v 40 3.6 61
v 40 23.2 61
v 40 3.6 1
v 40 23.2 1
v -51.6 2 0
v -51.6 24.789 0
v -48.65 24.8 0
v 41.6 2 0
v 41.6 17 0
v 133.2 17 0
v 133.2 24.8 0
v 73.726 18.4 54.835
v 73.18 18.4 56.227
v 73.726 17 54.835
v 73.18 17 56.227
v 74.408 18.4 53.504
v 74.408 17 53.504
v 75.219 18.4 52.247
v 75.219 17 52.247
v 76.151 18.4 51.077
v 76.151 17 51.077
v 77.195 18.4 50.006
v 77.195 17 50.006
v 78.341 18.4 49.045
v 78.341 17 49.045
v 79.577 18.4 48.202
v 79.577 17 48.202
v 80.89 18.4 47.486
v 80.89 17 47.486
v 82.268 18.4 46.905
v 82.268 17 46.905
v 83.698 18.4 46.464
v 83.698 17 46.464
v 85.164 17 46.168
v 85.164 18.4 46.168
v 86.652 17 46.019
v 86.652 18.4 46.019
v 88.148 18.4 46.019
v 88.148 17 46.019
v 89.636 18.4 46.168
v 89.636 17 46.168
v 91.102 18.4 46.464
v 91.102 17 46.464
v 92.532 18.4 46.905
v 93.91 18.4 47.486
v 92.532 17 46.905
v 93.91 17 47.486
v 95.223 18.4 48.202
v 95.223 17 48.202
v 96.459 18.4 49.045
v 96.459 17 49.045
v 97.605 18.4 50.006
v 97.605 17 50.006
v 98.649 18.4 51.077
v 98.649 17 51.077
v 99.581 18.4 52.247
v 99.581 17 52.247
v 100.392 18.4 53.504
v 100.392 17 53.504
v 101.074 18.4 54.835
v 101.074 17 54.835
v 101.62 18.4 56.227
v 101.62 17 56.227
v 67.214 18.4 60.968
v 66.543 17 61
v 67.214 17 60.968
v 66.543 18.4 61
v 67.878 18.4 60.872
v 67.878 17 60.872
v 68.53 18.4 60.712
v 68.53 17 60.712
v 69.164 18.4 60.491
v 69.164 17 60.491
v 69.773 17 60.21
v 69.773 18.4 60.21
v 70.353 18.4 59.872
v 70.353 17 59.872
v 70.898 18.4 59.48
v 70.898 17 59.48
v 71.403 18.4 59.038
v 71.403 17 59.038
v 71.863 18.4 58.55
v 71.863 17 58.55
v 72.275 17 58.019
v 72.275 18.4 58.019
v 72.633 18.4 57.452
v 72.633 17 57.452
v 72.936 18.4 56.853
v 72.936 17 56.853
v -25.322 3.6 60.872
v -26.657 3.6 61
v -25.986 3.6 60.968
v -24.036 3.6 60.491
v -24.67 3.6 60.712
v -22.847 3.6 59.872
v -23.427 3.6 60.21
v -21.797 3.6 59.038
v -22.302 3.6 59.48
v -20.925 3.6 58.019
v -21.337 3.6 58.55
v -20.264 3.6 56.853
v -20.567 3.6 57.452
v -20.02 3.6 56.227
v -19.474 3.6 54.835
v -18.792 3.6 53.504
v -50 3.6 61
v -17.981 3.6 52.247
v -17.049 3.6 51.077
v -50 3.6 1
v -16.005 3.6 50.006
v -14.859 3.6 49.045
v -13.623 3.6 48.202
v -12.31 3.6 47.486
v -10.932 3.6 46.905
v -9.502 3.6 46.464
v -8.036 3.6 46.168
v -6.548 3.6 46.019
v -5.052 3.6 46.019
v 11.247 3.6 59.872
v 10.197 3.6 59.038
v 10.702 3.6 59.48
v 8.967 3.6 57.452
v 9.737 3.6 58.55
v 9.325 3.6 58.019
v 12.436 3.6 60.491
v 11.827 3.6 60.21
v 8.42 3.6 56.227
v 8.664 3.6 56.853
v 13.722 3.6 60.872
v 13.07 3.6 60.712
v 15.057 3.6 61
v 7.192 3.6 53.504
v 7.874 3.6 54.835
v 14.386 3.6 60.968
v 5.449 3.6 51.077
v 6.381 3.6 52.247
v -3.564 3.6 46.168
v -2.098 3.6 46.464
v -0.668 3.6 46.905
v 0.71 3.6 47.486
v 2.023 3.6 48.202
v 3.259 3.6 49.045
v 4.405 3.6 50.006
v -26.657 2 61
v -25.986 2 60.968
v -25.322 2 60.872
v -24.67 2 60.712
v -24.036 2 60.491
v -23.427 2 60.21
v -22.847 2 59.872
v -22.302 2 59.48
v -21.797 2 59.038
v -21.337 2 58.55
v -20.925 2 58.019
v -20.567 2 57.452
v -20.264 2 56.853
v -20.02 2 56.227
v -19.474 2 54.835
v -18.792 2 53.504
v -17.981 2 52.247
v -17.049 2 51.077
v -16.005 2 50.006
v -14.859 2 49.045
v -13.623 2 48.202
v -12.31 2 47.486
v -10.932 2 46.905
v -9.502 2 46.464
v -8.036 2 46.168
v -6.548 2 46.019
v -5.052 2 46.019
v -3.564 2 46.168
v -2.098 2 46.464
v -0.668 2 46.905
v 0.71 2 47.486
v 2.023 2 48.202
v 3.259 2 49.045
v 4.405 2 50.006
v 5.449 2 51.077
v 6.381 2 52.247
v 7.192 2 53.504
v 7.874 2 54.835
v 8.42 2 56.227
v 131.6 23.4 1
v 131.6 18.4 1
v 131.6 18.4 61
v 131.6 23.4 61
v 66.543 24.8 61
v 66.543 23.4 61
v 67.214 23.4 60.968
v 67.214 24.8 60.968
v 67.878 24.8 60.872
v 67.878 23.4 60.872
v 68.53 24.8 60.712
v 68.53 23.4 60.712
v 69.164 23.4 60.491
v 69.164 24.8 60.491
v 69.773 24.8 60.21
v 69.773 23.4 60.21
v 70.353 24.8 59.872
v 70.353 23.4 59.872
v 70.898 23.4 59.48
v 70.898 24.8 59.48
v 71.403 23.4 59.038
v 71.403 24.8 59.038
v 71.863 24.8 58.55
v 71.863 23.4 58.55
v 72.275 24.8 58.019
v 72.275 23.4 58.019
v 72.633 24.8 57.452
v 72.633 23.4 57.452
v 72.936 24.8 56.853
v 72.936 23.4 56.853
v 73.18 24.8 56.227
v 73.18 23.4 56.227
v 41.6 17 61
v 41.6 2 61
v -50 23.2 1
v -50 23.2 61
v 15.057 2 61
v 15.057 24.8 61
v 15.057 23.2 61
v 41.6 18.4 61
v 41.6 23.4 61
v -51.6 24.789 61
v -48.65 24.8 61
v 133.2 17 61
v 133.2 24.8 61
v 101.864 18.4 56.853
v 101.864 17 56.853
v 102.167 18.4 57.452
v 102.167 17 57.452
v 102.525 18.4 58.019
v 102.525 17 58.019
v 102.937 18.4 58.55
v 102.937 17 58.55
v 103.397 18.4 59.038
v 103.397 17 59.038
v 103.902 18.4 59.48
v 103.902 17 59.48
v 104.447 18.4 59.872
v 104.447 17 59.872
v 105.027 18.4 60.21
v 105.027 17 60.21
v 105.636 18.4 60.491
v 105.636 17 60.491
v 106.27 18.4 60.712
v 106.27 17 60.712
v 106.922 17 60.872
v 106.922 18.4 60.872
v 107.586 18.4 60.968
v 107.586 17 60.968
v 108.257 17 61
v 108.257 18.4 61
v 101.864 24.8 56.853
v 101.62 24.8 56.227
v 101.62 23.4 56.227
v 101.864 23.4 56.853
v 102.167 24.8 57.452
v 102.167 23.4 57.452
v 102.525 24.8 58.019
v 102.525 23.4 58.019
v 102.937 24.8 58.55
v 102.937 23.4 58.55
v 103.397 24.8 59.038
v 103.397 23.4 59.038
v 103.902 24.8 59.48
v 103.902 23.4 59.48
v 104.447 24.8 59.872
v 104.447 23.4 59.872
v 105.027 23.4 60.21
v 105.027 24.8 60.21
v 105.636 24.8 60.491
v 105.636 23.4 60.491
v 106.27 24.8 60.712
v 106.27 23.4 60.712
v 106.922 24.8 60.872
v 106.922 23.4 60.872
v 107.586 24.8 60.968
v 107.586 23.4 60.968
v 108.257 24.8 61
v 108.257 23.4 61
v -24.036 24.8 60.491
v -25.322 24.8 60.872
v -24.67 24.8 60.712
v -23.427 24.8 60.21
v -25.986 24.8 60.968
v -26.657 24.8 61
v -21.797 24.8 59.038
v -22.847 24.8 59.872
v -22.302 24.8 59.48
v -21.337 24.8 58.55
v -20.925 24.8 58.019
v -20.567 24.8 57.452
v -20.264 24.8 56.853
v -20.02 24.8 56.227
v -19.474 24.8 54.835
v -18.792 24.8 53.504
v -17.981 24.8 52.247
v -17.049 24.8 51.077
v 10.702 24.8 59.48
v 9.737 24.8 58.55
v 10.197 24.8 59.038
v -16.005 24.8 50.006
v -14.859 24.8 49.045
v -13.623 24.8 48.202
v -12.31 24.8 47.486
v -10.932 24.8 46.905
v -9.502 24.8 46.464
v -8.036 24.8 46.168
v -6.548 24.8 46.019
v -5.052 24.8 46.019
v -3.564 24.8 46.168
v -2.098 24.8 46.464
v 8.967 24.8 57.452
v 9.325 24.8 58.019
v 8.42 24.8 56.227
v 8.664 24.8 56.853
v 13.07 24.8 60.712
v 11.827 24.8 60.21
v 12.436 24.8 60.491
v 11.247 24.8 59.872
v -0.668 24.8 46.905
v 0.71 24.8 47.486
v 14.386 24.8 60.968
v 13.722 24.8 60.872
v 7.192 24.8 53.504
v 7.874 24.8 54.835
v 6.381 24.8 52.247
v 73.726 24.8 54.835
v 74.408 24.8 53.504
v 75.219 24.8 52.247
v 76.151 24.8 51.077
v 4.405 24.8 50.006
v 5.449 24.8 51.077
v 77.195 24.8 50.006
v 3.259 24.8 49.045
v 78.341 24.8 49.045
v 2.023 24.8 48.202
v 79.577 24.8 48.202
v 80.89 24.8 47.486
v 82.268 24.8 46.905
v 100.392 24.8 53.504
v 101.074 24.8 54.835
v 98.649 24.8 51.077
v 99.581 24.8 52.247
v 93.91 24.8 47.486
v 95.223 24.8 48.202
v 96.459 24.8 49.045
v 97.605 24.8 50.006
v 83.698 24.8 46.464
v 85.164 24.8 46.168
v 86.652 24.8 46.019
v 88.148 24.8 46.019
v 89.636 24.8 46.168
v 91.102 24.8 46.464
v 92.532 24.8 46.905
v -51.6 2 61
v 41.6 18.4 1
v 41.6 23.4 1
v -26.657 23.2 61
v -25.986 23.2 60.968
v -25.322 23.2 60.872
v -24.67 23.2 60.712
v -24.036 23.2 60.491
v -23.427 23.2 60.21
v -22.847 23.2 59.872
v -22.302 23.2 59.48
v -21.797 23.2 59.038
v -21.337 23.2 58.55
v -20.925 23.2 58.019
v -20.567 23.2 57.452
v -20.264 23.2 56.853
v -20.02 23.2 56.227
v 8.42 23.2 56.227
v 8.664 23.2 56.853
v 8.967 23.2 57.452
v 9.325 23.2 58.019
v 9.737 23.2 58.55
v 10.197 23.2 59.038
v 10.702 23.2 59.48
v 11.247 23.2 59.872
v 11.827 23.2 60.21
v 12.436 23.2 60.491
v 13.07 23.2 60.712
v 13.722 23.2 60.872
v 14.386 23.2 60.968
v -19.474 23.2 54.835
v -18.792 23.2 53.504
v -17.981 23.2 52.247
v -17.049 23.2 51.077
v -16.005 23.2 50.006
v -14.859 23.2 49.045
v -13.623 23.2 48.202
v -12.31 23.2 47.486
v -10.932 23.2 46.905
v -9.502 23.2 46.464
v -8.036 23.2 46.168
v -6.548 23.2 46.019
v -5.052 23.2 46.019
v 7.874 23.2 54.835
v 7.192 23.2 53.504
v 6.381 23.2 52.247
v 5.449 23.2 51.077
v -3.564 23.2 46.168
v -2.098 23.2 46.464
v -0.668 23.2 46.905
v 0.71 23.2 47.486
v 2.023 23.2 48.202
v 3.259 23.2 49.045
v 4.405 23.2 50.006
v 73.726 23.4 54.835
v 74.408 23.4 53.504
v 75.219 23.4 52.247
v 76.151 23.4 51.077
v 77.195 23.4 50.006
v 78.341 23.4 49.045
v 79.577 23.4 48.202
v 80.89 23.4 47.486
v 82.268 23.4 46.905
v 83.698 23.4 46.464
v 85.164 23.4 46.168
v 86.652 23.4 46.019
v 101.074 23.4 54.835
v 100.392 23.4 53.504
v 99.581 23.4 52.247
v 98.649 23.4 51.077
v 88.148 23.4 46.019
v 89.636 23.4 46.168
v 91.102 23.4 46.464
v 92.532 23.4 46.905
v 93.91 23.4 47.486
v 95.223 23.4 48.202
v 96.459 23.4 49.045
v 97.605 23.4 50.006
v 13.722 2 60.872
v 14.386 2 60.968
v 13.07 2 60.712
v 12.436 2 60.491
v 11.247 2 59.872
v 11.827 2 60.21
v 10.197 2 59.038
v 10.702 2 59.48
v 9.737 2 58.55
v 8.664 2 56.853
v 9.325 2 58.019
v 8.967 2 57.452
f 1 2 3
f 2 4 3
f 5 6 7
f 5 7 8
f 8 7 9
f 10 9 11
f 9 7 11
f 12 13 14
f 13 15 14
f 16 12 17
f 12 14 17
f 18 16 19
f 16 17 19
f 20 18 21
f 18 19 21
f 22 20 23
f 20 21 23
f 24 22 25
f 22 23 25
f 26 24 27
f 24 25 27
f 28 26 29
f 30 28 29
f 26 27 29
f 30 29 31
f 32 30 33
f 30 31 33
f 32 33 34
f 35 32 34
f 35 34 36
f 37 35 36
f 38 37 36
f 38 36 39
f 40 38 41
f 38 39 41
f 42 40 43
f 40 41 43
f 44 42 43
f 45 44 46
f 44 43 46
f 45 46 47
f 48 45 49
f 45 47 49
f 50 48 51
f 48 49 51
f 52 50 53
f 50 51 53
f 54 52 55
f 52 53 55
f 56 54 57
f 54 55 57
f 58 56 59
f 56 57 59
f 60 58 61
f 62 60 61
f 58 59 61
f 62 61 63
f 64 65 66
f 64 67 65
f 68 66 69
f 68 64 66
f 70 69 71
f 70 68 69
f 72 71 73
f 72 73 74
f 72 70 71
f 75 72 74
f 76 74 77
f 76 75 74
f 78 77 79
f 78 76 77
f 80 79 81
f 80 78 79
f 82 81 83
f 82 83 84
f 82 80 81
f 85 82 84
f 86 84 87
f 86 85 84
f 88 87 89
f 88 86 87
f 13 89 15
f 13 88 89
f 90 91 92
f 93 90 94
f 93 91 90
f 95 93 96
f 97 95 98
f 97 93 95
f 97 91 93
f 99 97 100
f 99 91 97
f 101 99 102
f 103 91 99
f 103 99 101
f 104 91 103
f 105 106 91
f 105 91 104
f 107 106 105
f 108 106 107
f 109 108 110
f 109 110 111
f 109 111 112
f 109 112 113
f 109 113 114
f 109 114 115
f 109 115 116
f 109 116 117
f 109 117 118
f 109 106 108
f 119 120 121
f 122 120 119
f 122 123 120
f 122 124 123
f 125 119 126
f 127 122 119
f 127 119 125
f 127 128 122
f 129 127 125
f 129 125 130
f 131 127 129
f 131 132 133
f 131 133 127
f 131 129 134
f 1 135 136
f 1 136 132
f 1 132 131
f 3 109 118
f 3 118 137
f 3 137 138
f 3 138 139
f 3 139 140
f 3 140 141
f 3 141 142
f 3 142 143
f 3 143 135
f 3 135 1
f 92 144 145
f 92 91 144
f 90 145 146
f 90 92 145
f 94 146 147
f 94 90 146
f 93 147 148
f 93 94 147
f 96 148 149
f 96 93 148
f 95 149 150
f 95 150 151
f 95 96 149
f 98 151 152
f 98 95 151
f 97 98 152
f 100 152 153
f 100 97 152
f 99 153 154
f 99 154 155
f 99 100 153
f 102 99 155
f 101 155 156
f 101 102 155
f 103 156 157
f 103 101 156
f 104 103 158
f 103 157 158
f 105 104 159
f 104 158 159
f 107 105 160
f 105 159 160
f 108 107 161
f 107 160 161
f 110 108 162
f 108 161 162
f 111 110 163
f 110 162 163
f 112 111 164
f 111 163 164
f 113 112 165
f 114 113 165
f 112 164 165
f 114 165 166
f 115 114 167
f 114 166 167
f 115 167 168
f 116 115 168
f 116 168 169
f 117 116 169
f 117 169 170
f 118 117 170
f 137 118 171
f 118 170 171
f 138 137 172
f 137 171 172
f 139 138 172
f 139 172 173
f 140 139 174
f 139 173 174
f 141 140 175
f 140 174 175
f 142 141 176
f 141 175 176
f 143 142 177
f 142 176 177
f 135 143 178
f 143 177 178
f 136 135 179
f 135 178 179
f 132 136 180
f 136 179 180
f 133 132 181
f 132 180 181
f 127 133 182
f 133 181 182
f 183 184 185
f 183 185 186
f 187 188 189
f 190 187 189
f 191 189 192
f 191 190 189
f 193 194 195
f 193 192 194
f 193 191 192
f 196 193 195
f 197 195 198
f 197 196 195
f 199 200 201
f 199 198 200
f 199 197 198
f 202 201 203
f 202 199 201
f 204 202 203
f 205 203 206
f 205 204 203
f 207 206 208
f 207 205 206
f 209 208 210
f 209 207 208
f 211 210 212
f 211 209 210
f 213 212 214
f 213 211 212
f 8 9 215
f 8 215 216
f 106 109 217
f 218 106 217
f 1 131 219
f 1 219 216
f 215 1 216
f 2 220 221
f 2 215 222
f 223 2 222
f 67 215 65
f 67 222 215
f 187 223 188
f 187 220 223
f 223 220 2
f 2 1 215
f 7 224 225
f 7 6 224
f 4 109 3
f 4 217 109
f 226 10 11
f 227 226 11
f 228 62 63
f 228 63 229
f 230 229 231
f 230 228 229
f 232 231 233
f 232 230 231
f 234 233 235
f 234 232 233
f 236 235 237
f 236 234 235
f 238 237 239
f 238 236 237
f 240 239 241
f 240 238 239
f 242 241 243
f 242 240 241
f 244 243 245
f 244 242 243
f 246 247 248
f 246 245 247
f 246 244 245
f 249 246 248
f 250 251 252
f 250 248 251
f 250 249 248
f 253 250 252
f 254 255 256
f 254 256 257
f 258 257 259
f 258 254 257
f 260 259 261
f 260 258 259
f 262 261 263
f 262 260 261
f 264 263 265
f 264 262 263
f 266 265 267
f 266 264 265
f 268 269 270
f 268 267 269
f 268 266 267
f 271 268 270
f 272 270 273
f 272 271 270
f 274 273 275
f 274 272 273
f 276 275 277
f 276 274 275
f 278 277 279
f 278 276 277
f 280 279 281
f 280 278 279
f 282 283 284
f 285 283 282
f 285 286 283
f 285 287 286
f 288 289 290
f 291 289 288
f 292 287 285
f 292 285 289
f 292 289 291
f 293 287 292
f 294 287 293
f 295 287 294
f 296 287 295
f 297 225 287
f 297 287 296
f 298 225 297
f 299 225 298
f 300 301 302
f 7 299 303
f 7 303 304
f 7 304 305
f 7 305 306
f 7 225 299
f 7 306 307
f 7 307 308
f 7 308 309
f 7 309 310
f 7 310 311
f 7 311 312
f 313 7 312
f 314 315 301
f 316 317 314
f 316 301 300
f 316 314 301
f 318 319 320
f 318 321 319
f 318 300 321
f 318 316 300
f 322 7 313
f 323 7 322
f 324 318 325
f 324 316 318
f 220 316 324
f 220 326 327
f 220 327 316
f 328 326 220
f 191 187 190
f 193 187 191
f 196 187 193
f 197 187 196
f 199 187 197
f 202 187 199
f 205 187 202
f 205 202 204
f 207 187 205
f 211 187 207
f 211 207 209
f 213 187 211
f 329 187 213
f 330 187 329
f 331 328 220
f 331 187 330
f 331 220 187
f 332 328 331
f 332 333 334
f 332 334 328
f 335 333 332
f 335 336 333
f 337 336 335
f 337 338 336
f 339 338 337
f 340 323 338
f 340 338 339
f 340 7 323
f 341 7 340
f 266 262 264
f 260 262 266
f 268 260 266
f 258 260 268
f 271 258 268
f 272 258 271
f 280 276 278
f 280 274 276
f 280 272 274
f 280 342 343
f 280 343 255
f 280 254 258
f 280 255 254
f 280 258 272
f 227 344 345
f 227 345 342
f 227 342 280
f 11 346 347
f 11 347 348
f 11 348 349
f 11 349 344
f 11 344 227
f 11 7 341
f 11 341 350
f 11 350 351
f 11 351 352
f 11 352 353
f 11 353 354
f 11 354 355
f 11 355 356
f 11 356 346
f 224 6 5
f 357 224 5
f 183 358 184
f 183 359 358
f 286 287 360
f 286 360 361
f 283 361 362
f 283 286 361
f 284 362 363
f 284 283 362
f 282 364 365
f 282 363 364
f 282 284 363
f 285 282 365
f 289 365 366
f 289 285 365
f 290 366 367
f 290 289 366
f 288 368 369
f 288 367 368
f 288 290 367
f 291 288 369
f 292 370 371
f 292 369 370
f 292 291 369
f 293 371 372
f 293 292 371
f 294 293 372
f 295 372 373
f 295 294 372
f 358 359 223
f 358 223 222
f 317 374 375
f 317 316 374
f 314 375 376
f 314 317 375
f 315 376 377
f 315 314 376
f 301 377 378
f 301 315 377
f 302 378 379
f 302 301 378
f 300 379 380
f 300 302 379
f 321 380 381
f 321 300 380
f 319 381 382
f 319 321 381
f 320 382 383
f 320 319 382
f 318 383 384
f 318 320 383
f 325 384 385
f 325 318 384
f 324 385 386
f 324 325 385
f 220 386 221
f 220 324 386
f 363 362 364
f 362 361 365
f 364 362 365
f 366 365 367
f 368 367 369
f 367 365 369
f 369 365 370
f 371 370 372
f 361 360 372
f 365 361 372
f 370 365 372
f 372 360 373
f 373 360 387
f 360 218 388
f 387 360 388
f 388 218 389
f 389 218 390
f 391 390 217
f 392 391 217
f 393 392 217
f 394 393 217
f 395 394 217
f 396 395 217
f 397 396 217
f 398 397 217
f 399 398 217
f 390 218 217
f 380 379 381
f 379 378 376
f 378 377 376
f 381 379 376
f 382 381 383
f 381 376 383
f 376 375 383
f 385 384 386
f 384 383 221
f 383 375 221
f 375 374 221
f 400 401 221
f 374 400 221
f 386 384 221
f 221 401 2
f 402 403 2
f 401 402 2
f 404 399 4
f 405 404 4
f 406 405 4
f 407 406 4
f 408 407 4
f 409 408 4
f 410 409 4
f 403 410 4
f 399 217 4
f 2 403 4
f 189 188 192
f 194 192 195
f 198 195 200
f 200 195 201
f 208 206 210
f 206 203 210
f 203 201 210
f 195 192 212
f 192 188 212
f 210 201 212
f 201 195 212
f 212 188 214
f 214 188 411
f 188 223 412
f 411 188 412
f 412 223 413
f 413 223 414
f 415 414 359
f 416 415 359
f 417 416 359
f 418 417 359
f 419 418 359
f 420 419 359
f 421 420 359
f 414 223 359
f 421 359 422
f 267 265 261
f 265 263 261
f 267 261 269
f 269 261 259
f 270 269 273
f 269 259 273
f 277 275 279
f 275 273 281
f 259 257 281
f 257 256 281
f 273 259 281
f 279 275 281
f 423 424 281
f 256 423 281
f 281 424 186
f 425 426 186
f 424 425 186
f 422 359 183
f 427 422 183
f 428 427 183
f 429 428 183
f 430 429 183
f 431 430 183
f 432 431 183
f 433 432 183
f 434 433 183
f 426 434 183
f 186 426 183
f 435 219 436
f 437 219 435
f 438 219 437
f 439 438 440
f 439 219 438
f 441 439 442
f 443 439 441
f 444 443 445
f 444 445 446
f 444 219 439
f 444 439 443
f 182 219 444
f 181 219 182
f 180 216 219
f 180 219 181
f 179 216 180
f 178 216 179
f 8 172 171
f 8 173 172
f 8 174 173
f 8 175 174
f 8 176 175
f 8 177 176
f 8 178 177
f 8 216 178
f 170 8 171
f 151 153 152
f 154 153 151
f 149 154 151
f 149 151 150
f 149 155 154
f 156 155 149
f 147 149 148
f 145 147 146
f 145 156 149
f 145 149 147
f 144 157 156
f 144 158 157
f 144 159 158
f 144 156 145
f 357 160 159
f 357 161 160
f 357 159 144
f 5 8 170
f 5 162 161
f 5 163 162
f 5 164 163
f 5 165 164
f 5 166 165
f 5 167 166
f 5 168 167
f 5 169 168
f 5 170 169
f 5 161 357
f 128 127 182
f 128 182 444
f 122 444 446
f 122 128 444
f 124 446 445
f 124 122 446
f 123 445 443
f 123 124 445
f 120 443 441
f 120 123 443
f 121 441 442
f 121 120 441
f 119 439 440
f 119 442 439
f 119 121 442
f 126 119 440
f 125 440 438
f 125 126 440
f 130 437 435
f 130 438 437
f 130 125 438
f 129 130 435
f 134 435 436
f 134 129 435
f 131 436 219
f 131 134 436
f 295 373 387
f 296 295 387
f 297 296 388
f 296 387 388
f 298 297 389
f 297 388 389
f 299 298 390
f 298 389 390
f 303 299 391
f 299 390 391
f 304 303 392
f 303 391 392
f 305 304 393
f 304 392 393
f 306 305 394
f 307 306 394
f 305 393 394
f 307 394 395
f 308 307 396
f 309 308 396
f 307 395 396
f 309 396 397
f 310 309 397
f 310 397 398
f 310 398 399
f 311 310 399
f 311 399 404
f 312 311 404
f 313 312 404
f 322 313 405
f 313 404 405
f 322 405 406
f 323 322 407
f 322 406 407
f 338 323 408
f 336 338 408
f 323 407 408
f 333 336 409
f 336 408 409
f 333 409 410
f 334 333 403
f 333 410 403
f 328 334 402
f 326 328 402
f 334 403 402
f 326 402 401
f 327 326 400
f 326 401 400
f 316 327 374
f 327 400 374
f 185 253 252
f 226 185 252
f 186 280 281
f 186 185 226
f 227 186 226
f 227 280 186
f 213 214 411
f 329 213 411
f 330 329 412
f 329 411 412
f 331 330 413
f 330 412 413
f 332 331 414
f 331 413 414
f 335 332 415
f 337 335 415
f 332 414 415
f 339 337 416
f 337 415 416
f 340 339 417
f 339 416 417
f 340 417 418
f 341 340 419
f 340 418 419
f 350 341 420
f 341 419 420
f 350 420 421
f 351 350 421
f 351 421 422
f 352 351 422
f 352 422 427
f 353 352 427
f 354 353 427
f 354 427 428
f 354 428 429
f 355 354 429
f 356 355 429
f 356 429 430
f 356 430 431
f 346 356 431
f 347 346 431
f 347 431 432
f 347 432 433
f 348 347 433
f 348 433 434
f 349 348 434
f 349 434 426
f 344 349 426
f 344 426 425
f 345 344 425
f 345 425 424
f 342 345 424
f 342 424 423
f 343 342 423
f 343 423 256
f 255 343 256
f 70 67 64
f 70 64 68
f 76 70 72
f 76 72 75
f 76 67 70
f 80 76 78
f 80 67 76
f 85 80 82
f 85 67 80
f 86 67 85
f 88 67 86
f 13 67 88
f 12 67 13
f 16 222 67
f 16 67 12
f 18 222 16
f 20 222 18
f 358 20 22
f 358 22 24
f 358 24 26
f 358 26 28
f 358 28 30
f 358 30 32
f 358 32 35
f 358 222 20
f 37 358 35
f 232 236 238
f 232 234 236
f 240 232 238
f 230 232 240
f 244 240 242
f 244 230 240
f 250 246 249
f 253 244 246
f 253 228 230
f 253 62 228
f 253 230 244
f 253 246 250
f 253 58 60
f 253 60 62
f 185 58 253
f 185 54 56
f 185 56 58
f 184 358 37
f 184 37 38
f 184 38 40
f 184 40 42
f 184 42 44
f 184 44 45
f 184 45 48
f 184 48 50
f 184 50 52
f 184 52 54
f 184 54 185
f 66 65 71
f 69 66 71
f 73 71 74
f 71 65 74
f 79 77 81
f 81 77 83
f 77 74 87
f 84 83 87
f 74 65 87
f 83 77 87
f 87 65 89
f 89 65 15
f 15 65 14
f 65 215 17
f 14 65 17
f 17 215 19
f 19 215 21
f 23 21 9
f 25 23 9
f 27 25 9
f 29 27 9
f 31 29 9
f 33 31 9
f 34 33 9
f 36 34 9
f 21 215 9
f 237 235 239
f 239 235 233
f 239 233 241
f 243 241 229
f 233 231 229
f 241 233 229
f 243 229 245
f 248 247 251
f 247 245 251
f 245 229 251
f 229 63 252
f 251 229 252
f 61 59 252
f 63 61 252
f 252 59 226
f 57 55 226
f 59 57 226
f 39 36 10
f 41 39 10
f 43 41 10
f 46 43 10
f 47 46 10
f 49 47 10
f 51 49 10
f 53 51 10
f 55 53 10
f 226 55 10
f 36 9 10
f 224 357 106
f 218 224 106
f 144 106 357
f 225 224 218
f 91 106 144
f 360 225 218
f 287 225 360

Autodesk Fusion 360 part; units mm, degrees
sketch "Sketch1" plane through (0, 0, 0) normal (0, 0, 1) x (1, 0, 0)
  line L0 (-48.6499, 24.8) -> (41.3501, 24.8)
  line L1 (40, 23.2) -> (40, 3.6)
  line L2 (40, 2) -> (-51.6764, 2)
  line L3 (-50, 3.6) -> (-50, 23.2)
  line L4 (-51.6, 24.7889) -> (-51.6, 2)
  line L5 (-51.6, 2) -> (-51.6764, 2)
  line L6 (-51.6, 24.7889) -> (-48.6499, 24.8)
  line L7 (41.3501, 24.8) -> (41.6, 24.8)
  line L8 (41.6, 2) -> (40, 2)
  line L9 (-50, 23.2) -> (40, 23.2)
  line L10 (-50, 3.6) -> (40, 3.6)
  line L11 (41.6, 17) -> (131.6, 17)
  line L12 (41.6, 18.4) -> (131.6, 18.4)
  line L13 (41.6, 24.8) -> (131.6, 24.8)
  line L14 (41.6, 23.4) -> (131.6, 23.4)
  line L15 (131.6, 18.4) -> (131.6, 23.4)
  line L16 (131.6, 24.8) -> (133.2, 24.8)
  line L17 (131.6, 17) -> (133.2, 17)
  line L18 (133.2, 17) -> (133.2, 24.8)
  line L19 (41.6, 23.4) -> (41.6, 18.4)
  line L20 (41.6, 17) -> (41.6, 2)
  dimension "d1" = 90
  dimension "d2" = 23
  dimension "d3" = 1.6
  dimension "d4" = 1.6
  dimension "d5" = 1.6
  dimension "d6" = 1.6
  dimension "d7" = 90
  dimension "d8" = 15
  dimension "d9" = 90
  dimension "d10" = 1.4
  dimension "d11" = 90
  dimension "d12" = 90
  dimension "d13" = 90
  dimension "d14" = 1.4
  dimension "d15" = 1.6
  dimension "d16" = 1.6
extrude "Extrude1" add sketch "Sketch1" along normal blind 61
extrude "Extrude2" add sketch "Sketch1" along normal blind 1 contours L1 L3 L9 L10 | L12 L14 L15 L19
sketch "Sketch2" plane through (0, 2, 0) normal (0, -1, 0) x (1, 0, 0)
  line L0 (-51.6, 0) -> (40, 0)
  line L1 (40, 0) -> (40, 61)
  line L2 (40, 61) -> (-51.6, 61)
  line L3 (-51.6, 61) -> (-51.6, 0)
  arc A0 (-20.8, 61) -> (9.2, 61) centre (-5.8, 61) ccw
  dimension "d21" = 30
sketch "Sketch3" plane through (0, 17, 0) normal (0, -1, 0) x (1, 0, 0)
  line L0 (41.6, 0) -> (133.2, 0)
  line L1 (133.2, 0) -> (133.2, 61)
  line L2 (133.2, 61) -> (41.6, 61)
  line L3 (41.6, 61) -> (41.6, 0)
  arc A0 (72.4, 61) -> (102.4, 61) centre (87.4, 61) ccw
  dimension "d22" = 30
extrude "Extrude3" cut sketch "Sketch2" against normal blind 41 contours L2 A0
extrude "Extrude4" cut sketch "Sketch3" against normal blind 28 contours L2 A0
fillet "Fillet1" radius 7 8 edges at (-20.8, 24, 61) (-20.8, 2.8, 61) (9.2, 2.8, 61) (9.2, 24, 61) (72.4, 24.1, 61) (72.4, 17.7, 61) (102.4, 17.7, 61) (102.4, 24.1, 61)
